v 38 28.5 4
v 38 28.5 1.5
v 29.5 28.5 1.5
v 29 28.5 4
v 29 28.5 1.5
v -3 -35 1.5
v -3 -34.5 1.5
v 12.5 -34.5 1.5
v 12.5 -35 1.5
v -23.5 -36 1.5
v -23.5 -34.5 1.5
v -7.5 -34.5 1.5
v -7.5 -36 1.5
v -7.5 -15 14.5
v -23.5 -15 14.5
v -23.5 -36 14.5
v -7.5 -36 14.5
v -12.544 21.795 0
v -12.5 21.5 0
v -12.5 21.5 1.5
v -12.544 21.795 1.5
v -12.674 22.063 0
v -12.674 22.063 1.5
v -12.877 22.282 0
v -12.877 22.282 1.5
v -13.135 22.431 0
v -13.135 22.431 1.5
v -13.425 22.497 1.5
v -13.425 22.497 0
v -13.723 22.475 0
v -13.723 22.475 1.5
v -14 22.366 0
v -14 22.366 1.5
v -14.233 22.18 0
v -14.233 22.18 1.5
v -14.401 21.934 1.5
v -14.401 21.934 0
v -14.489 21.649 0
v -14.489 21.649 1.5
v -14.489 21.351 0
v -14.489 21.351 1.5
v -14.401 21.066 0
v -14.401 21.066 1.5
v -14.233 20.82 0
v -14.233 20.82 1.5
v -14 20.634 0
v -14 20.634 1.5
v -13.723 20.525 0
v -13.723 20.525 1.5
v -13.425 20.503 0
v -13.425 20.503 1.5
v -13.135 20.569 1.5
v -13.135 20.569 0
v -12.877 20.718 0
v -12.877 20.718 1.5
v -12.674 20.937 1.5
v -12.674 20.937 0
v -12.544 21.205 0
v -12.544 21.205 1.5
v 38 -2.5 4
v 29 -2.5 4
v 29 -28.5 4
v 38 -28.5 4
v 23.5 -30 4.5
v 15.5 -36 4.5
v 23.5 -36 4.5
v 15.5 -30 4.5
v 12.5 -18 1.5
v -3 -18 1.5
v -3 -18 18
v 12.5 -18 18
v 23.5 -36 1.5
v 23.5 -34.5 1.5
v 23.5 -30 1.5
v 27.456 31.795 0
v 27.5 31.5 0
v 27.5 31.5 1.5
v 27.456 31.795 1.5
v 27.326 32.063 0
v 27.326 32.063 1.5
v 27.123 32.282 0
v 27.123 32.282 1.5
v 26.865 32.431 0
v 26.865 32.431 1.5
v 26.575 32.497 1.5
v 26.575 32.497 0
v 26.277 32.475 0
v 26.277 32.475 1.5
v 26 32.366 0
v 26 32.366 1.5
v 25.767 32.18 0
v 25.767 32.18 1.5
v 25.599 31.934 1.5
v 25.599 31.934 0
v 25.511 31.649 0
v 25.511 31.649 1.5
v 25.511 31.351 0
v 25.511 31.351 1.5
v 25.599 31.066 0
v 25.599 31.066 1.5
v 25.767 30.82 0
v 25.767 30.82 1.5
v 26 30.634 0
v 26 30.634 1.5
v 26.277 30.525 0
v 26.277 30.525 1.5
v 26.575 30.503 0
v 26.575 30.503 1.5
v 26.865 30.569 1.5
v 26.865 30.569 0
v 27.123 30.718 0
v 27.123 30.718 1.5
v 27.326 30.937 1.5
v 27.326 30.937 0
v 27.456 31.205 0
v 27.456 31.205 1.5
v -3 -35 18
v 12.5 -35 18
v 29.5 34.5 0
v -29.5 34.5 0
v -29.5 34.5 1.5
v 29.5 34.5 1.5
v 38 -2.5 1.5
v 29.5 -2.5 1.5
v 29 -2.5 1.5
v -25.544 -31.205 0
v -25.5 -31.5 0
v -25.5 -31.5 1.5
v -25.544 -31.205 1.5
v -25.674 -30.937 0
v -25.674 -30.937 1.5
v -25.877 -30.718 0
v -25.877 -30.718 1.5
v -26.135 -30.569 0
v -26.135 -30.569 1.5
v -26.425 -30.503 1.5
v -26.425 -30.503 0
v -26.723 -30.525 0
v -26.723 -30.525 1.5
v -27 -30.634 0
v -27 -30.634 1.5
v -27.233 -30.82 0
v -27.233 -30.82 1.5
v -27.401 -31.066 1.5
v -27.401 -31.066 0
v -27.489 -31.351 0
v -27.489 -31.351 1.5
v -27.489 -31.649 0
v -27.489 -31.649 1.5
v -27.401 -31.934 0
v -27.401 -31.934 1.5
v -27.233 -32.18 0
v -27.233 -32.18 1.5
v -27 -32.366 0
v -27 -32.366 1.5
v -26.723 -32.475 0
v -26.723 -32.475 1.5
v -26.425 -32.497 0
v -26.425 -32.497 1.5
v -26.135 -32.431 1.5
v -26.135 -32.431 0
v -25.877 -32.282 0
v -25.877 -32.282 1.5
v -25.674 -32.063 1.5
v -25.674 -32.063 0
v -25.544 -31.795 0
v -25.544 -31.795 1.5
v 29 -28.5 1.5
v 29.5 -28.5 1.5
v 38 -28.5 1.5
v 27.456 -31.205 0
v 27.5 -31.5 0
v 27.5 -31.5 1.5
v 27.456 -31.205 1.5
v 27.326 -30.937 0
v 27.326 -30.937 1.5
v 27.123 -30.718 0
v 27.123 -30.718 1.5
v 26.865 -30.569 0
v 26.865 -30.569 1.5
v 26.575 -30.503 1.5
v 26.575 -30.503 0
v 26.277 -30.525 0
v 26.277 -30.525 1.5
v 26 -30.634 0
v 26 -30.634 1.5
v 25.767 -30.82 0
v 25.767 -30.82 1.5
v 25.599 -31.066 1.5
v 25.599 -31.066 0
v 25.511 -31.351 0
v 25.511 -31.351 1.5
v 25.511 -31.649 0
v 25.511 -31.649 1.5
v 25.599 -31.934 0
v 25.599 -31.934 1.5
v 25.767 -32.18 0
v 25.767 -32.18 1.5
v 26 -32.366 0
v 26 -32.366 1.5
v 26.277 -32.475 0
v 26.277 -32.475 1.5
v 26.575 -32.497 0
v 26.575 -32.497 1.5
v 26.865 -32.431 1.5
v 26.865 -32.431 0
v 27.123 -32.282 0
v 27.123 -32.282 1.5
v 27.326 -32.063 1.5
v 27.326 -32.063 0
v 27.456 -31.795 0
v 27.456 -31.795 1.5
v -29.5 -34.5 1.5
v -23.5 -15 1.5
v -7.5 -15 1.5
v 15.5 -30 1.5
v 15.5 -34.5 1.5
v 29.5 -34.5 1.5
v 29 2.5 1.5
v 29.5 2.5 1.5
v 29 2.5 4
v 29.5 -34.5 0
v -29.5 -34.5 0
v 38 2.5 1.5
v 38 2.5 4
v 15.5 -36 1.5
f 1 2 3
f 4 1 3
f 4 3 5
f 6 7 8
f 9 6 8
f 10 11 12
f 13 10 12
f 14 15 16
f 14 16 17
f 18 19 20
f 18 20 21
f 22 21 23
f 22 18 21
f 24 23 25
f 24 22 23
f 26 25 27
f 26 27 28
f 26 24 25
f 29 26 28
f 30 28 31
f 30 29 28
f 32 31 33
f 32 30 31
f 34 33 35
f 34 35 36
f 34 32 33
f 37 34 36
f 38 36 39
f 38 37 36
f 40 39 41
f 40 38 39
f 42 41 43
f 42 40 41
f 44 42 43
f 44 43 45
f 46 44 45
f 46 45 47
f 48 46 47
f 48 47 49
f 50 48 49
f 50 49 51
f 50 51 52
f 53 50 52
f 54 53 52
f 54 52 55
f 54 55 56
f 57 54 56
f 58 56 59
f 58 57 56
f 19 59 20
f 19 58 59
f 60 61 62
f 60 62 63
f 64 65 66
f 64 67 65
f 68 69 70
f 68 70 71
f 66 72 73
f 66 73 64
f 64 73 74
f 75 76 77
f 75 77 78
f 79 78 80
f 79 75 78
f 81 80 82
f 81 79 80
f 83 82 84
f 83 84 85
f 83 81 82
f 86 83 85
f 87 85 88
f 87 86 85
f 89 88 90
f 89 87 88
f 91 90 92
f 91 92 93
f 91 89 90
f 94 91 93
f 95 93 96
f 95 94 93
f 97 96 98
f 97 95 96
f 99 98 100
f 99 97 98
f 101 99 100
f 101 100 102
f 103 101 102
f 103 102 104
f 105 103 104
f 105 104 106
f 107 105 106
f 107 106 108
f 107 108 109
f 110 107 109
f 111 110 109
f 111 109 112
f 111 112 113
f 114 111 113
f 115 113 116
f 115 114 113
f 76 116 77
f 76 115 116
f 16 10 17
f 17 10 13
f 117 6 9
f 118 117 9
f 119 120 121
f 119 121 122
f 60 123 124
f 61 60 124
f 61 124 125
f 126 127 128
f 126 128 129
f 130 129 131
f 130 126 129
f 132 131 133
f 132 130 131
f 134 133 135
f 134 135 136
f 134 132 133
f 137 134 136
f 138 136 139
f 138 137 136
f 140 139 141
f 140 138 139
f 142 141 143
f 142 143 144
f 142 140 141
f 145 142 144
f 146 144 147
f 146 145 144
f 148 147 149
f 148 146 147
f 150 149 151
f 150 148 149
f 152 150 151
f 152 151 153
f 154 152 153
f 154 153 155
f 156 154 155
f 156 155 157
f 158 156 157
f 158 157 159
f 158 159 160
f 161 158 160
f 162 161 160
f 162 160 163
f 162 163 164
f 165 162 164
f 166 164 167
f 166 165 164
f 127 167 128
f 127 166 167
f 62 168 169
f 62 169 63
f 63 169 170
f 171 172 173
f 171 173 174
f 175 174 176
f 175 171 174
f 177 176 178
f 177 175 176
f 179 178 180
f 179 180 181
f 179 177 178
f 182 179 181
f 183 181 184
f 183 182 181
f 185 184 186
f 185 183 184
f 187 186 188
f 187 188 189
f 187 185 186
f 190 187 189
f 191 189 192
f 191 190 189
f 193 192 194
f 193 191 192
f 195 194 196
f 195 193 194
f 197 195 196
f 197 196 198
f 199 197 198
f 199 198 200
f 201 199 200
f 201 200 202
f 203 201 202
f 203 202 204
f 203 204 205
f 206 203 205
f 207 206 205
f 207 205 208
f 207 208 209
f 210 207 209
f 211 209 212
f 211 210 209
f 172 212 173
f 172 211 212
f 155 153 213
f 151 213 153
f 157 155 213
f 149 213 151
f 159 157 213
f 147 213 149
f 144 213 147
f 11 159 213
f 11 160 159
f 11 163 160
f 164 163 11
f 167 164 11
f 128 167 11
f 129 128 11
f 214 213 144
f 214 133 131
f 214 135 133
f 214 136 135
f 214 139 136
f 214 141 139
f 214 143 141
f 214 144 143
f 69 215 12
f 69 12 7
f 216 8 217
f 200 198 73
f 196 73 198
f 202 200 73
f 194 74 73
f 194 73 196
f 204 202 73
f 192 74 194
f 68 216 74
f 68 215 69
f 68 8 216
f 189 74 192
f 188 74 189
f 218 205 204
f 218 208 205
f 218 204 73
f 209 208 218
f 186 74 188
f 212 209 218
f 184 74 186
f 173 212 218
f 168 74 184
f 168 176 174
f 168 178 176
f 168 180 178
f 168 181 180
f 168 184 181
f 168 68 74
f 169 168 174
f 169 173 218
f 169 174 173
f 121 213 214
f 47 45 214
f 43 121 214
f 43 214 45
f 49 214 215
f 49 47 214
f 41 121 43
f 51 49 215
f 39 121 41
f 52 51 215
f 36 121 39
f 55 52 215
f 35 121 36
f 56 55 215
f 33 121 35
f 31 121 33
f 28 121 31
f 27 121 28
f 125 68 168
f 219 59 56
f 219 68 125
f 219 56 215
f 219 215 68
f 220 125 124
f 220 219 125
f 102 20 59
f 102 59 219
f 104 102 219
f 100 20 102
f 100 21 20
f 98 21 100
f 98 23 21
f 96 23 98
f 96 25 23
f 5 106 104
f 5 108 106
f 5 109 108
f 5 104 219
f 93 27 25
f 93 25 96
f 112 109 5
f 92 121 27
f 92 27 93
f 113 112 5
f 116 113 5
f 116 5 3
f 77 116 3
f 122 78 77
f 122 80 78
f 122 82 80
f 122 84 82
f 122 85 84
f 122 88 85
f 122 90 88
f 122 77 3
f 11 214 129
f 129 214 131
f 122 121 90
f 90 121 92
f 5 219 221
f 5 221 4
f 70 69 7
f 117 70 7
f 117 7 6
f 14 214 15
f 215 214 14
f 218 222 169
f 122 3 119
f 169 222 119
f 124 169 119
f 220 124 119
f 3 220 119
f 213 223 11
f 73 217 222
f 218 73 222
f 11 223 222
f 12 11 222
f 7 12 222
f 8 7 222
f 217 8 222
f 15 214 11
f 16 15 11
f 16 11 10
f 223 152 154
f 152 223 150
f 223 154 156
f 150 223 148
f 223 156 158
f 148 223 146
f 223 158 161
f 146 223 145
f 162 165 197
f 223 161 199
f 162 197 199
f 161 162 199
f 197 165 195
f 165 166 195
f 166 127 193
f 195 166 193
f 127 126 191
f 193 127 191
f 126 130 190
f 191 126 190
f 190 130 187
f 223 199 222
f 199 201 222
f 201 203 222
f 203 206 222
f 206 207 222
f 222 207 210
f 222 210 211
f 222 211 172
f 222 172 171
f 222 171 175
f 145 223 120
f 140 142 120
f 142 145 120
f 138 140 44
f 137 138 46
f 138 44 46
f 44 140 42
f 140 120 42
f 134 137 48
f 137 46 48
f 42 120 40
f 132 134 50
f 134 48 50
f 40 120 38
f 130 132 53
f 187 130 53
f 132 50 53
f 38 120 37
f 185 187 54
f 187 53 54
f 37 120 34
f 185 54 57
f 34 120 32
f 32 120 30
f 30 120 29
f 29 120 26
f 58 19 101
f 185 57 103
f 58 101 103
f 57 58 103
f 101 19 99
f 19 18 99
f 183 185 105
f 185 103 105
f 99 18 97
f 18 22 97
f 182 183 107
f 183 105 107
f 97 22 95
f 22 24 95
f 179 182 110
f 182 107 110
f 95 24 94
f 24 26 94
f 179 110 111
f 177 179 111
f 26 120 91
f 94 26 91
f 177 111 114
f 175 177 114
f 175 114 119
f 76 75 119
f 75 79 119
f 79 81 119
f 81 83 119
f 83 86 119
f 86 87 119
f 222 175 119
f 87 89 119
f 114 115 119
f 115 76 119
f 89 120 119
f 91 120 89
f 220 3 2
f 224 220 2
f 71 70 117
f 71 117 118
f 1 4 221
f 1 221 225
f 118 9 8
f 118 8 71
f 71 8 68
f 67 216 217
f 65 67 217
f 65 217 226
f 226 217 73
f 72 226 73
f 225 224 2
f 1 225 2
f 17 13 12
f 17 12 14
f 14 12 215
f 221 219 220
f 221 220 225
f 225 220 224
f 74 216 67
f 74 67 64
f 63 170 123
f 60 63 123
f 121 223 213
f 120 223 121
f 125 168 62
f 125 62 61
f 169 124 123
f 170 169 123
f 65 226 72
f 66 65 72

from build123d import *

# Parameters (mm, degrees)
F0_W     = 59
F0_H     = 69
F0_R     = 1
F1_DEPTH = 1.5
F2_W     = 8
F2_H     = 1.5
F2_H_2   = 4.5
F3_DEPTH = 3
F2_W_2   = 15.5
F2_H_3   = 16.5
F2_H_4   = 0.5
F4_DEPTH = 16.5
F2_W_3   = 16
F2_H_5   = 19.5
F5_DEPTH = 13
F2_W_4   = 0.5
F2_H_6   = 26
F2_W_5   = 8.5
F6_DEPTH = 2.5


with BuildPart() as f1:
    # F0 (on Top) → F1 (new body)
    with BuildSketch(Plane.XY):
        Rectangle(F0_W, F0_H)
        with Locations((-26.5, -31.5)):
            Circle(F0_R, mode=Mode.SUBTRACT)
        with Locations((26.5, -31.5)):
            Circle(F0_R, mode=Mode.SUBTRACT)
        with Locations((-13.5, 21.5)):
            Circle(F0_R, mode=Mode.SUBTRACT)
        with Locations((26.5, 31.5)):
            Circle(F0_R, mode=Mode.SUBTRACT)
    extrude(amount=F1_DEPTH)

    # F2 (on face) → F3 (join)
    with BuildSketch(Plane.XY.offset(1.5)):
        with Locations((19.5, -35.25)):
            Rectangle(F2_W, F2_H)
        with Locations((19.5, -32.25)):
            Rectangle(F2_W, F2_H_2)
    extrude(amount=F3_DEPTH)

    # F2 (on face) → F4 (join)
    with BuildSketch(Plane.XY.offset(1.5)):
        with Locations((4.75, -26.25)):
            Rectangle(F2_W_2, F2_H_3)
        with Locations((4.75, -34.75)):
            Rectangle(F2_W_2, F2_H_4)
    extrude(amount=F4_DEPTH)

    # F2 (on face) → F5 (join)
    with BuildSketch(Plane.XY.offset(1.5)):
        with Locations((-15.5, -24.75)):
            Rectangle(F2_W_3, F2_H_5)
        with Locations((-15.5, -35.25)):
            Rectangle(F2_W_3, F2_H)
    extrude(amount=F5_DEPTH)

    # F2 (on face) → F6 (join)
    with BuildSketch(Plane.XY.offset(1.5)):
        with Locations((29.25, 15.5)):
            Rectangle(F2_W_4, F2_H_6)
        with Locations((33.75, 15.5)):
            Rectangle(F2_W_5, F2_H_6)
        with Locations((29.25, -15.5)):
            Rectangle(F2_W_4, F2_H_6)
        with Locations((33.75, -15.5)):
            Rectangle(F2_W_5, F2_H_6)
    extrude(amount=F6_DEPTH)


solid = f1.part
